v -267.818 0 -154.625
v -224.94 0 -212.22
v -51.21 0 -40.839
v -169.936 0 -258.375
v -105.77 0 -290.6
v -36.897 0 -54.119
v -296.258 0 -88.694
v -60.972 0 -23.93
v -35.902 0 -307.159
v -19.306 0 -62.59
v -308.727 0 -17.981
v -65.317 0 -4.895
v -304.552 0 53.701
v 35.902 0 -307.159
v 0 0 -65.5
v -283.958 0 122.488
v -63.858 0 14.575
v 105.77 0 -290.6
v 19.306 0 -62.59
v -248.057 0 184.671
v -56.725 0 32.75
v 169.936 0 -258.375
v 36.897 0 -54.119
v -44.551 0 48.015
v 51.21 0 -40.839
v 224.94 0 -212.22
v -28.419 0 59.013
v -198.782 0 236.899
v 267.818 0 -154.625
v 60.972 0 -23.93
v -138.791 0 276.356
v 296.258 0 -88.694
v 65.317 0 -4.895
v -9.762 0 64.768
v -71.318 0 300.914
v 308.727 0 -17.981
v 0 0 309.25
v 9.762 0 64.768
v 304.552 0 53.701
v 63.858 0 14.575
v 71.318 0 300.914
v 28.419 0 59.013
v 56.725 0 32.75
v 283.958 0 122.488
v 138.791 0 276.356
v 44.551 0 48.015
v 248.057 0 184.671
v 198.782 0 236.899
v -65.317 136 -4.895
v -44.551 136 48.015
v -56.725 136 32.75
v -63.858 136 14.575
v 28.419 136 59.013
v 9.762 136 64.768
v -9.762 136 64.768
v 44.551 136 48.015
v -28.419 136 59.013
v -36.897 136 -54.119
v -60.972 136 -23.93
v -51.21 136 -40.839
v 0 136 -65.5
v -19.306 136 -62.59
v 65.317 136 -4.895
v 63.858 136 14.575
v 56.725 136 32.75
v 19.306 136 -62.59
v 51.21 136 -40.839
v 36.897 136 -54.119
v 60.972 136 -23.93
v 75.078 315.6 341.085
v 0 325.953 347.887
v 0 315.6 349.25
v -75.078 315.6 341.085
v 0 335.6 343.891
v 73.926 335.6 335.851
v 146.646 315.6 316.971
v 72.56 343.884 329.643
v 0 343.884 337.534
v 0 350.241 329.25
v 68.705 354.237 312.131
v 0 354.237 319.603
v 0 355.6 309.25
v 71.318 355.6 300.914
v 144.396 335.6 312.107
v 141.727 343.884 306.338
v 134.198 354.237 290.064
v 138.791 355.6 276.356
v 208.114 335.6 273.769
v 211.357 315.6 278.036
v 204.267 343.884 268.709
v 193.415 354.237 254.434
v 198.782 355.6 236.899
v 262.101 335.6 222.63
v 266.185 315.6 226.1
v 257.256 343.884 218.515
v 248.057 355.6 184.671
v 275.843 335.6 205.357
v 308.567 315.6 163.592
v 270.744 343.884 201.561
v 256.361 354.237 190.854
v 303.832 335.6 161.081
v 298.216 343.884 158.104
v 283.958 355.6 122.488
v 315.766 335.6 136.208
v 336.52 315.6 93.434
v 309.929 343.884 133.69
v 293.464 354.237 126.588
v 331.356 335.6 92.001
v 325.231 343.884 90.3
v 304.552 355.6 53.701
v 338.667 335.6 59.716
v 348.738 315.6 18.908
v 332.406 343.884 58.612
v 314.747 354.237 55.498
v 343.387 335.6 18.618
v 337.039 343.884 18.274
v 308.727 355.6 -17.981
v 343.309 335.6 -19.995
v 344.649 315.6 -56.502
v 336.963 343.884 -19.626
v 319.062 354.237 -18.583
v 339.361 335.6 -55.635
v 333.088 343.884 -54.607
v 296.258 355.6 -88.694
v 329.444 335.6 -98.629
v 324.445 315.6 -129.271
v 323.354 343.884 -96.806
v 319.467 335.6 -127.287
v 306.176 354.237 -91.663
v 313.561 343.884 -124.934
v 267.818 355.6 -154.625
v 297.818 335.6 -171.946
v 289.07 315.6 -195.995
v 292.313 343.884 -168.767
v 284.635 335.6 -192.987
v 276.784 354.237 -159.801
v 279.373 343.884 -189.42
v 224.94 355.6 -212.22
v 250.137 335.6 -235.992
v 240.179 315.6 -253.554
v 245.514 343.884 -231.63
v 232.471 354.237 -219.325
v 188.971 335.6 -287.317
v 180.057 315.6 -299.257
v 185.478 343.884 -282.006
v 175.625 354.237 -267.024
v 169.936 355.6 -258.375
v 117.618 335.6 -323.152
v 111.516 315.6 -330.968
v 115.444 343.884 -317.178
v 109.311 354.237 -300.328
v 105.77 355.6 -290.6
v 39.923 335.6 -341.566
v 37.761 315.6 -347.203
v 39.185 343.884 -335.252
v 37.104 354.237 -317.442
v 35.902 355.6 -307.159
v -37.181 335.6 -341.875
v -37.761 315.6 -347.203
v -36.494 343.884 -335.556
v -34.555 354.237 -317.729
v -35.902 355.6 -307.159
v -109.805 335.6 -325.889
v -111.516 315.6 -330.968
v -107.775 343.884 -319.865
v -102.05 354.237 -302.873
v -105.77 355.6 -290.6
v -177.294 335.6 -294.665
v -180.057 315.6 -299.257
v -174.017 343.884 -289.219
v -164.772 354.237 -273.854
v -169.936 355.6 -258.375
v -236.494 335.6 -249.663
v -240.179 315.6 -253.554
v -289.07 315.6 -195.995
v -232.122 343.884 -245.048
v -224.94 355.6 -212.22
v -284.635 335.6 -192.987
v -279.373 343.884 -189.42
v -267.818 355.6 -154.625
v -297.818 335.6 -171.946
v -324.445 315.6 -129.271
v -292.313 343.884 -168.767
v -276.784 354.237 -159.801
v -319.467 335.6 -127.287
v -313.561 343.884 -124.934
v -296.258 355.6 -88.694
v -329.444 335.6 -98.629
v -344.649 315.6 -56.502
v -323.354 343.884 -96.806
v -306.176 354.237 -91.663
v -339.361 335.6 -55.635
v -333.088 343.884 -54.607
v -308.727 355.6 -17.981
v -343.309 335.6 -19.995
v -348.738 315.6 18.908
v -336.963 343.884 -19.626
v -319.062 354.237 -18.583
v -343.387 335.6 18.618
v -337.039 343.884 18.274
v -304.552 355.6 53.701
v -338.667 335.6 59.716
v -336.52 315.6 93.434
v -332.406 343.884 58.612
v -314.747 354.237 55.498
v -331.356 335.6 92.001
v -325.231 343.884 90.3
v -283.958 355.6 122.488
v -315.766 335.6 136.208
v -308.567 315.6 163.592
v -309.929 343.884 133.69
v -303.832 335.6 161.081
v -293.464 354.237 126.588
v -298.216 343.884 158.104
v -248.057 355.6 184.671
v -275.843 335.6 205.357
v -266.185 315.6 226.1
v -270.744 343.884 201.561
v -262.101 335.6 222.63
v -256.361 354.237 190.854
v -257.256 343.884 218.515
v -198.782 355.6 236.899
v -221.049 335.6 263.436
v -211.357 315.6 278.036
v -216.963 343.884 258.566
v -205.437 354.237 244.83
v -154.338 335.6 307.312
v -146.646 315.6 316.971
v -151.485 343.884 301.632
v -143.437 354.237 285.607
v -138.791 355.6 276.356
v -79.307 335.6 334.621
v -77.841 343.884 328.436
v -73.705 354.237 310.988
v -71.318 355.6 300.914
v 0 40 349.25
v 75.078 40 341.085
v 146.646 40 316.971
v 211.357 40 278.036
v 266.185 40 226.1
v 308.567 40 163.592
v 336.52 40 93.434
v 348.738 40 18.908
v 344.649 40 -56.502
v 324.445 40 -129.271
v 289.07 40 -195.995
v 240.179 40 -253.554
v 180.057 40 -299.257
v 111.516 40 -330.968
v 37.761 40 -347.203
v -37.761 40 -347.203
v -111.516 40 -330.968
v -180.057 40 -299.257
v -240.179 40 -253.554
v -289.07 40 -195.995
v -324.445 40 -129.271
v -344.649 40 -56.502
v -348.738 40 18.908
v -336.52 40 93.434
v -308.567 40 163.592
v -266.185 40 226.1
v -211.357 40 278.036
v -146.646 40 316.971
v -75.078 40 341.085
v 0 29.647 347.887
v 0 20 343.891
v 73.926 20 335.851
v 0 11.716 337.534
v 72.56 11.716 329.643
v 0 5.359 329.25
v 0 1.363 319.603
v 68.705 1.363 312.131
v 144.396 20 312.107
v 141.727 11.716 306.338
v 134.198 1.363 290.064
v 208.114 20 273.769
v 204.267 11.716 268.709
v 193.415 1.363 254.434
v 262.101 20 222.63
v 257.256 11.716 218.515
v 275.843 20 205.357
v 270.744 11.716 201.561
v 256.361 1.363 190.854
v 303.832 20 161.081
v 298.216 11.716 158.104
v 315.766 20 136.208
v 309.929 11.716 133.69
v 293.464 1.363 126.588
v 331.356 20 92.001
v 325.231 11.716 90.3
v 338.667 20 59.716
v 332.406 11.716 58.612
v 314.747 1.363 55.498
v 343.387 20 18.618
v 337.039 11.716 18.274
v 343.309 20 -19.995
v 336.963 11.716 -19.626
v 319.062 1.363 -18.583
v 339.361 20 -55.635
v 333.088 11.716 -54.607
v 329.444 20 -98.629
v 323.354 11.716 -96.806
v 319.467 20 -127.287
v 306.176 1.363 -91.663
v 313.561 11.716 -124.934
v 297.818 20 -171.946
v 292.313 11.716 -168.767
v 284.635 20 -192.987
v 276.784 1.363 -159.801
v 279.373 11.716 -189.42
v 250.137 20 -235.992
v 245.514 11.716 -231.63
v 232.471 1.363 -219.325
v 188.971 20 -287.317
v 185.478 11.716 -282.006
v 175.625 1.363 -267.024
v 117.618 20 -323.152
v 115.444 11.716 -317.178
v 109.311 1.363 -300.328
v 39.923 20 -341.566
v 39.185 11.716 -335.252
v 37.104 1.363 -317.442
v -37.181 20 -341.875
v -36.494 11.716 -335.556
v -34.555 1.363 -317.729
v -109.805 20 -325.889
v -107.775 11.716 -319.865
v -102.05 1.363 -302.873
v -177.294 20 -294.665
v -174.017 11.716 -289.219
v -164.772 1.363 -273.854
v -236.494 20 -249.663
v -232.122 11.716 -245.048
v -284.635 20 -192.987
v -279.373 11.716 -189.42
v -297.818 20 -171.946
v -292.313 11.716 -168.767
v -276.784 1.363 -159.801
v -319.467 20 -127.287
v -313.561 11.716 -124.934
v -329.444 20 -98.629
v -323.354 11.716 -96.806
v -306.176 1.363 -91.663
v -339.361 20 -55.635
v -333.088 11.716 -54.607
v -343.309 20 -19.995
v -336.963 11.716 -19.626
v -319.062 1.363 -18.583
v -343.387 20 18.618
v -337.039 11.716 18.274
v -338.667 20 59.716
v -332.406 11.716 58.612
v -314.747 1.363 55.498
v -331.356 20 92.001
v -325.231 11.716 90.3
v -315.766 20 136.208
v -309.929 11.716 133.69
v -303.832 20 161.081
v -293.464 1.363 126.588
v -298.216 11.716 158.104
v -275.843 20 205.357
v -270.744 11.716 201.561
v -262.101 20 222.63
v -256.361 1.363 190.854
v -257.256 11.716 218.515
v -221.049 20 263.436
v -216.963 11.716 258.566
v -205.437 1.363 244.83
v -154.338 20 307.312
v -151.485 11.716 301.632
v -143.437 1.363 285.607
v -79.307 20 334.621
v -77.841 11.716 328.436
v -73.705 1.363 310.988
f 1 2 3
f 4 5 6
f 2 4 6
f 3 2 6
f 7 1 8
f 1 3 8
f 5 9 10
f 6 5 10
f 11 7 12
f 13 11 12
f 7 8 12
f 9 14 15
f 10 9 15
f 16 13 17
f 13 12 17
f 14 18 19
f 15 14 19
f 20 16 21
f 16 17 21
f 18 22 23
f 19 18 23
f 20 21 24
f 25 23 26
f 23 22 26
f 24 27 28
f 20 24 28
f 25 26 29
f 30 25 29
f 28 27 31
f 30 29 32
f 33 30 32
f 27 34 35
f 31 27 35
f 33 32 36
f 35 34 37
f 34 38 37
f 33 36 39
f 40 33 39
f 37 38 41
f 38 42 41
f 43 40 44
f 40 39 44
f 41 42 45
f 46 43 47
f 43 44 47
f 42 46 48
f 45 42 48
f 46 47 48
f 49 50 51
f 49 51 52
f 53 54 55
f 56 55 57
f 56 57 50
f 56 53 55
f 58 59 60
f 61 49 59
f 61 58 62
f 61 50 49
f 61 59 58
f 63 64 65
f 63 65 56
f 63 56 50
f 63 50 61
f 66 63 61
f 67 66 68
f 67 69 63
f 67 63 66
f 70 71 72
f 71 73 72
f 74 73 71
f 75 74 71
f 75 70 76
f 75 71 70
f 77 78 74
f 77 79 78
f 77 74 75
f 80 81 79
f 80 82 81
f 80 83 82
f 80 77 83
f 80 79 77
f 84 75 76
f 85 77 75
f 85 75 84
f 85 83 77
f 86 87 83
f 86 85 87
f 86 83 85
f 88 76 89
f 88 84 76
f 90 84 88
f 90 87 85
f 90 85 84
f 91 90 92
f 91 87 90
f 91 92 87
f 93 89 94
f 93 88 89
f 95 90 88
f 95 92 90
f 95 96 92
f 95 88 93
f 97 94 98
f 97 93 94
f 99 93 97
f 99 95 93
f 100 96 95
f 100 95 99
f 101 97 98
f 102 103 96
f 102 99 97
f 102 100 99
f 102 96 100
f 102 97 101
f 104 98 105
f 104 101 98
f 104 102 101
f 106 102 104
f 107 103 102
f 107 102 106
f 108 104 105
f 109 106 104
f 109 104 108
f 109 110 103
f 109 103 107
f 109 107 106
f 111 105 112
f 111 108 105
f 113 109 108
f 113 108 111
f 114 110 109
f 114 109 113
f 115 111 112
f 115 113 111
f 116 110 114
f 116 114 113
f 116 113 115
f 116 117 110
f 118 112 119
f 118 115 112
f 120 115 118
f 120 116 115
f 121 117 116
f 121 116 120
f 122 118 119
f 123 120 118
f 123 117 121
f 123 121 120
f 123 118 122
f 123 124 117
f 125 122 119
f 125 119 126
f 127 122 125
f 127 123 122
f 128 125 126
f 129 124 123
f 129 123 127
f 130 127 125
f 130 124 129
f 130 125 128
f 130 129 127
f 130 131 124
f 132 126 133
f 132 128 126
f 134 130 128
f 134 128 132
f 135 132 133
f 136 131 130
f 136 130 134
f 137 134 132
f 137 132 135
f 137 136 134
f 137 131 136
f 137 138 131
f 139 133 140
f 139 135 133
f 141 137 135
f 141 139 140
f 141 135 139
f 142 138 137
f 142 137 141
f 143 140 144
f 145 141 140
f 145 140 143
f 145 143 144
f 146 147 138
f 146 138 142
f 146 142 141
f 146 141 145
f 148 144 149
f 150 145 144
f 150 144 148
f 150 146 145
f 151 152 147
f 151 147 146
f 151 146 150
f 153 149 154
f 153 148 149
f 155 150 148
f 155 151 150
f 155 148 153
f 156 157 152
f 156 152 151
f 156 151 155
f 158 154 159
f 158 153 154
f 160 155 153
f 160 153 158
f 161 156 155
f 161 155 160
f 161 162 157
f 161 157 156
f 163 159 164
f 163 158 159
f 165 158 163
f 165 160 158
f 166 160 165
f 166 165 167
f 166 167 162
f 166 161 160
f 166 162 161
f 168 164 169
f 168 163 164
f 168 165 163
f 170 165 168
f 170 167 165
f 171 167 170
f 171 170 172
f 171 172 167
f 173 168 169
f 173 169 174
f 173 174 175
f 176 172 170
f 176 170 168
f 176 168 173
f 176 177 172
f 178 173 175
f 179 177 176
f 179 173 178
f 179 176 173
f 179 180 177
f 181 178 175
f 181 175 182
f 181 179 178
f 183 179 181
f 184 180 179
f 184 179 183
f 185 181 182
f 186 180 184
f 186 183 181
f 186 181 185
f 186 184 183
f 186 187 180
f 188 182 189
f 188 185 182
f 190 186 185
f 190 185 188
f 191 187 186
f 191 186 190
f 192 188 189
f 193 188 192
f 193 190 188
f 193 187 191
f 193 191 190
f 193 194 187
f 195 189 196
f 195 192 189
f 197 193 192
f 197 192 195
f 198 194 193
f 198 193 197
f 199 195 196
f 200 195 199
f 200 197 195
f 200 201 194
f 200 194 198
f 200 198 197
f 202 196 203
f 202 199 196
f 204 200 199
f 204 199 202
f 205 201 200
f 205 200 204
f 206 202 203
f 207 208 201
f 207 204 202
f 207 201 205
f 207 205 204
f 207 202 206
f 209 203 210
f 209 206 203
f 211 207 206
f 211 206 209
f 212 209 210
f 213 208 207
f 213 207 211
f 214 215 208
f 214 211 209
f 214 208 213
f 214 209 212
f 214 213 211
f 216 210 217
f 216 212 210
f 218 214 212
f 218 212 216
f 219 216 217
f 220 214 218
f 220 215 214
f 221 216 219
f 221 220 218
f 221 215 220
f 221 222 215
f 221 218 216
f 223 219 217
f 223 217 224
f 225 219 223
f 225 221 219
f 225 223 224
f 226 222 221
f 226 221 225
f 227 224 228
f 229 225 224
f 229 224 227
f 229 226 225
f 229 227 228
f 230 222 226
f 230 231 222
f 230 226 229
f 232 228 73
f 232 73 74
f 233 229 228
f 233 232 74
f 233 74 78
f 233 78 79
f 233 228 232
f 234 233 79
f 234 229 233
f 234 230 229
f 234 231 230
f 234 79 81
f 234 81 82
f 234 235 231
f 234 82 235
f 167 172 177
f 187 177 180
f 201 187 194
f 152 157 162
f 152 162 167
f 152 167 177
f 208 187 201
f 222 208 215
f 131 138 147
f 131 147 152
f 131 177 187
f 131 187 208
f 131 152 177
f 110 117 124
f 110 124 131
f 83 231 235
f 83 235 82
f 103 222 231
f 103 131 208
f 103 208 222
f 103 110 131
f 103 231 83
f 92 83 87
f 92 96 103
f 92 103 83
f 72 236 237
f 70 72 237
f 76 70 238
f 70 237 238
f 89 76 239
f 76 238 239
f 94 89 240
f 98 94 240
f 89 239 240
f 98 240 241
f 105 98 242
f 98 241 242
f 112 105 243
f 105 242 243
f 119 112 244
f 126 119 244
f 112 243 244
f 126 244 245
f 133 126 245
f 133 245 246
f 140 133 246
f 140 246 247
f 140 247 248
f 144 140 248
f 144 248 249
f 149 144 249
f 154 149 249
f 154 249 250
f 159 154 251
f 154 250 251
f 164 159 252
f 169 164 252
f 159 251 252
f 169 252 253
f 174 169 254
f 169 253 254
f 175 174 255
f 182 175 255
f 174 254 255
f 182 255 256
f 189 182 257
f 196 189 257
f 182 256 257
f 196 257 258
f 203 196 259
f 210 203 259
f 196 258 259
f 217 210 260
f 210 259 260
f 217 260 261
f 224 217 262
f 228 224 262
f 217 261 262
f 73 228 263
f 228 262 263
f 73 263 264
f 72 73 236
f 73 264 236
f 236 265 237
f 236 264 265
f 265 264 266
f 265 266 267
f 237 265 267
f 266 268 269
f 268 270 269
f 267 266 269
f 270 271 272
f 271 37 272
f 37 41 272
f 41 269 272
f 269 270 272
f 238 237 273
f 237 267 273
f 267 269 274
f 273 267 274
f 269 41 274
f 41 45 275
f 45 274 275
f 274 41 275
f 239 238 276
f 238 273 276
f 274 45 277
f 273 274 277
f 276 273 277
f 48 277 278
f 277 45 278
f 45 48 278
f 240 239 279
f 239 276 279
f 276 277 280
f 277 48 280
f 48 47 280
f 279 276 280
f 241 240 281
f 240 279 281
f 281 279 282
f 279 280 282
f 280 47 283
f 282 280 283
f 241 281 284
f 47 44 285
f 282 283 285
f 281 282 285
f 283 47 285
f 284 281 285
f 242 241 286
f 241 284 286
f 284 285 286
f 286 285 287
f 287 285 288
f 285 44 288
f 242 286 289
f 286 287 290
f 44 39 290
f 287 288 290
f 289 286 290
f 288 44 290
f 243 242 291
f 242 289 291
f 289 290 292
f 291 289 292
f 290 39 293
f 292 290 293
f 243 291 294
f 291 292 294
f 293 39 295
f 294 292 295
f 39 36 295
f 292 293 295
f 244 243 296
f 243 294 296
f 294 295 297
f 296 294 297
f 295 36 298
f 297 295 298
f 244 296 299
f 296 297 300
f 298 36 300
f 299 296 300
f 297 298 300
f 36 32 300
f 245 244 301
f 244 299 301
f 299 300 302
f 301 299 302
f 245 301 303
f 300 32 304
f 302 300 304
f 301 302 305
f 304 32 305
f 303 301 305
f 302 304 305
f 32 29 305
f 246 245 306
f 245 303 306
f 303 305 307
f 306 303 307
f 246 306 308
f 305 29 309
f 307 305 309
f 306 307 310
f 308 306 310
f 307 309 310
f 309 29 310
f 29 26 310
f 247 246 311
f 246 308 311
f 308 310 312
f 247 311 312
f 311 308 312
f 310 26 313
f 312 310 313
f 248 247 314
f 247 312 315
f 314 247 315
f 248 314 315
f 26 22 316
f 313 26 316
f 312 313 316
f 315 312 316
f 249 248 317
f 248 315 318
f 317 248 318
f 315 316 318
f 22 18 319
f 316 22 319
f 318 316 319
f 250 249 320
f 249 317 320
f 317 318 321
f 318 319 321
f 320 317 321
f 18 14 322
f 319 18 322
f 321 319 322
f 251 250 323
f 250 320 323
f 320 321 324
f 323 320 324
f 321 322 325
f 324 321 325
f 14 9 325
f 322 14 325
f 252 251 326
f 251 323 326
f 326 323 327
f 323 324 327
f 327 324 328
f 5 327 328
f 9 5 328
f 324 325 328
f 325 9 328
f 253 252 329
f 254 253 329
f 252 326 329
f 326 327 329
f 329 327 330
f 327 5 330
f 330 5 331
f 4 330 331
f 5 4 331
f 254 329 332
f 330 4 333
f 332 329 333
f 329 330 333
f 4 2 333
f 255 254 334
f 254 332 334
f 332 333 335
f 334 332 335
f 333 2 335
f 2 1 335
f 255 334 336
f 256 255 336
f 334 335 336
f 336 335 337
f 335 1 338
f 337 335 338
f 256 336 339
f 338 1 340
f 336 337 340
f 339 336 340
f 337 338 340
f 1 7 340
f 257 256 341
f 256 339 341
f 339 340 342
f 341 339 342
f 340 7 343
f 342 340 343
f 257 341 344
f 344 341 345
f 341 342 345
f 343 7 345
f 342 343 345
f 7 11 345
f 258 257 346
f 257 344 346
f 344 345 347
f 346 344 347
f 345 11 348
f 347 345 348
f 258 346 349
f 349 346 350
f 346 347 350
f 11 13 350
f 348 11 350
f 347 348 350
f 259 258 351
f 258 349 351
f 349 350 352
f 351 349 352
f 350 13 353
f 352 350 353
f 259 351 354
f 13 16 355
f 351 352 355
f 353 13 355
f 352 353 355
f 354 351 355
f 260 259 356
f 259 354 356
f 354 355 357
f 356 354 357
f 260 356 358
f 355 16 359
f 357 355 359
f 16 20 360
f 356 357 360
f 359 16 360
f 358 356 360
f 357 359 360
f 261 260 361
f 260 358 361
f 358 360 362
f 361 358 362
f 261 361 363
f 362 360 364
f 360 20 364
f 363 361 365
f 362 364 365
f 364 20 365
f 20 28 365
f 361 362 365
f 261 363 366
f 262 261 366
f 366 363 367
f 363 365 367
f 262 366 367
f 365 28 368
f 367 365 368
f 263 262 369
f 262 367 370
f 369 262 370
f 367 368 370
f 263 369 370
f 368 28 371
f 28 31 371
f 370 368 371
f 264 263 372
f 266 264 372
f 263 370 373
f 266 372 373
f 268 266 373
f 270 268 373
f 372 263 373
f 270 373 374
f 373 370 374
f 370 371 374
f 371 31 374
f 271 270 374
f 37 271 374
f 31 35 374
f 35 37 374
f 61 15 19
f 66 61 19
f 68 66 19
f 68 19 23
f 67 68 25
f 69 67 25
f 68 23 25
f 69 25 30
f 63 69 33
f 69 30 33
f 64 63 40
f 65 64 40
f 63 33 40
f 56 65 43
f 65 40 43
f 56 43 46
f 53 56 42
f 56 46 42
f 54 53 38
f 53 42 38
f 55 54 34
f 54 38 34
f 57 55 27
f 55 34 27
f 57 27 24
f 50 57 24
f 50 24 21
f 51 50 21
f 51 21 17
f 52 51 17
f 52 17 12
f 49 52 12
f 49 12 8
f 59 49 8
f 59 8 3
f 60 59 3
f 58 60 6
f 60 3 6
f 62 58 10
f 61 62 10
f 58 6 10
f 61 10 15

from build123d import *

# Parameters (mm, degrees)
SCHIZZO1_R                   = 349.25
ESTRUSIONE_ESTRUSIONE1_DEPTH = 355.6
RACCORDO1_R                  = 40
SCHIZZO2_R                   = 65.5
TAGLIO_ESTRUSIONE1_DEPTH     = 136


with BuildPart() as part:
    # Schizzo1 → Estrusione-Estrusione1 (new body)
    with BuildSketch(Plane(origin=(0, 0, 0), x_dir=(-1, 0, 0), z_dir=(0, 1, 0))):
        with Locations(Location((0, 0, 0), (0, 0, 90))):
            Circle(SCHIZZO1_R)
    extrude(amount=ESTRUSIONE_ESTRUSIONE1_DEPTH)

    # Raccordo1
    raccordo1_edges = [part.edges().sort_by_distance(p)[0] for p in [
        (0, 0, -349.25),
        (0, 355.6, -349.25),
    ]]
    fillet(raccordo1_edges, radius=RACCORDO1_R)

    # Schizzo2 → Taglio-Estrusione1 (cut)
    with BuildSketch(Plane.XZ):
        with Locations(Location((0, 0, 0), (0, 0, 270))):
            Circle(SCHIZZO2_R)
    extrude(amount=-TAGLIO_ESTRUSIONE1_DEPTH, mode=Mode.SUBTRACT)


solid = part.part
